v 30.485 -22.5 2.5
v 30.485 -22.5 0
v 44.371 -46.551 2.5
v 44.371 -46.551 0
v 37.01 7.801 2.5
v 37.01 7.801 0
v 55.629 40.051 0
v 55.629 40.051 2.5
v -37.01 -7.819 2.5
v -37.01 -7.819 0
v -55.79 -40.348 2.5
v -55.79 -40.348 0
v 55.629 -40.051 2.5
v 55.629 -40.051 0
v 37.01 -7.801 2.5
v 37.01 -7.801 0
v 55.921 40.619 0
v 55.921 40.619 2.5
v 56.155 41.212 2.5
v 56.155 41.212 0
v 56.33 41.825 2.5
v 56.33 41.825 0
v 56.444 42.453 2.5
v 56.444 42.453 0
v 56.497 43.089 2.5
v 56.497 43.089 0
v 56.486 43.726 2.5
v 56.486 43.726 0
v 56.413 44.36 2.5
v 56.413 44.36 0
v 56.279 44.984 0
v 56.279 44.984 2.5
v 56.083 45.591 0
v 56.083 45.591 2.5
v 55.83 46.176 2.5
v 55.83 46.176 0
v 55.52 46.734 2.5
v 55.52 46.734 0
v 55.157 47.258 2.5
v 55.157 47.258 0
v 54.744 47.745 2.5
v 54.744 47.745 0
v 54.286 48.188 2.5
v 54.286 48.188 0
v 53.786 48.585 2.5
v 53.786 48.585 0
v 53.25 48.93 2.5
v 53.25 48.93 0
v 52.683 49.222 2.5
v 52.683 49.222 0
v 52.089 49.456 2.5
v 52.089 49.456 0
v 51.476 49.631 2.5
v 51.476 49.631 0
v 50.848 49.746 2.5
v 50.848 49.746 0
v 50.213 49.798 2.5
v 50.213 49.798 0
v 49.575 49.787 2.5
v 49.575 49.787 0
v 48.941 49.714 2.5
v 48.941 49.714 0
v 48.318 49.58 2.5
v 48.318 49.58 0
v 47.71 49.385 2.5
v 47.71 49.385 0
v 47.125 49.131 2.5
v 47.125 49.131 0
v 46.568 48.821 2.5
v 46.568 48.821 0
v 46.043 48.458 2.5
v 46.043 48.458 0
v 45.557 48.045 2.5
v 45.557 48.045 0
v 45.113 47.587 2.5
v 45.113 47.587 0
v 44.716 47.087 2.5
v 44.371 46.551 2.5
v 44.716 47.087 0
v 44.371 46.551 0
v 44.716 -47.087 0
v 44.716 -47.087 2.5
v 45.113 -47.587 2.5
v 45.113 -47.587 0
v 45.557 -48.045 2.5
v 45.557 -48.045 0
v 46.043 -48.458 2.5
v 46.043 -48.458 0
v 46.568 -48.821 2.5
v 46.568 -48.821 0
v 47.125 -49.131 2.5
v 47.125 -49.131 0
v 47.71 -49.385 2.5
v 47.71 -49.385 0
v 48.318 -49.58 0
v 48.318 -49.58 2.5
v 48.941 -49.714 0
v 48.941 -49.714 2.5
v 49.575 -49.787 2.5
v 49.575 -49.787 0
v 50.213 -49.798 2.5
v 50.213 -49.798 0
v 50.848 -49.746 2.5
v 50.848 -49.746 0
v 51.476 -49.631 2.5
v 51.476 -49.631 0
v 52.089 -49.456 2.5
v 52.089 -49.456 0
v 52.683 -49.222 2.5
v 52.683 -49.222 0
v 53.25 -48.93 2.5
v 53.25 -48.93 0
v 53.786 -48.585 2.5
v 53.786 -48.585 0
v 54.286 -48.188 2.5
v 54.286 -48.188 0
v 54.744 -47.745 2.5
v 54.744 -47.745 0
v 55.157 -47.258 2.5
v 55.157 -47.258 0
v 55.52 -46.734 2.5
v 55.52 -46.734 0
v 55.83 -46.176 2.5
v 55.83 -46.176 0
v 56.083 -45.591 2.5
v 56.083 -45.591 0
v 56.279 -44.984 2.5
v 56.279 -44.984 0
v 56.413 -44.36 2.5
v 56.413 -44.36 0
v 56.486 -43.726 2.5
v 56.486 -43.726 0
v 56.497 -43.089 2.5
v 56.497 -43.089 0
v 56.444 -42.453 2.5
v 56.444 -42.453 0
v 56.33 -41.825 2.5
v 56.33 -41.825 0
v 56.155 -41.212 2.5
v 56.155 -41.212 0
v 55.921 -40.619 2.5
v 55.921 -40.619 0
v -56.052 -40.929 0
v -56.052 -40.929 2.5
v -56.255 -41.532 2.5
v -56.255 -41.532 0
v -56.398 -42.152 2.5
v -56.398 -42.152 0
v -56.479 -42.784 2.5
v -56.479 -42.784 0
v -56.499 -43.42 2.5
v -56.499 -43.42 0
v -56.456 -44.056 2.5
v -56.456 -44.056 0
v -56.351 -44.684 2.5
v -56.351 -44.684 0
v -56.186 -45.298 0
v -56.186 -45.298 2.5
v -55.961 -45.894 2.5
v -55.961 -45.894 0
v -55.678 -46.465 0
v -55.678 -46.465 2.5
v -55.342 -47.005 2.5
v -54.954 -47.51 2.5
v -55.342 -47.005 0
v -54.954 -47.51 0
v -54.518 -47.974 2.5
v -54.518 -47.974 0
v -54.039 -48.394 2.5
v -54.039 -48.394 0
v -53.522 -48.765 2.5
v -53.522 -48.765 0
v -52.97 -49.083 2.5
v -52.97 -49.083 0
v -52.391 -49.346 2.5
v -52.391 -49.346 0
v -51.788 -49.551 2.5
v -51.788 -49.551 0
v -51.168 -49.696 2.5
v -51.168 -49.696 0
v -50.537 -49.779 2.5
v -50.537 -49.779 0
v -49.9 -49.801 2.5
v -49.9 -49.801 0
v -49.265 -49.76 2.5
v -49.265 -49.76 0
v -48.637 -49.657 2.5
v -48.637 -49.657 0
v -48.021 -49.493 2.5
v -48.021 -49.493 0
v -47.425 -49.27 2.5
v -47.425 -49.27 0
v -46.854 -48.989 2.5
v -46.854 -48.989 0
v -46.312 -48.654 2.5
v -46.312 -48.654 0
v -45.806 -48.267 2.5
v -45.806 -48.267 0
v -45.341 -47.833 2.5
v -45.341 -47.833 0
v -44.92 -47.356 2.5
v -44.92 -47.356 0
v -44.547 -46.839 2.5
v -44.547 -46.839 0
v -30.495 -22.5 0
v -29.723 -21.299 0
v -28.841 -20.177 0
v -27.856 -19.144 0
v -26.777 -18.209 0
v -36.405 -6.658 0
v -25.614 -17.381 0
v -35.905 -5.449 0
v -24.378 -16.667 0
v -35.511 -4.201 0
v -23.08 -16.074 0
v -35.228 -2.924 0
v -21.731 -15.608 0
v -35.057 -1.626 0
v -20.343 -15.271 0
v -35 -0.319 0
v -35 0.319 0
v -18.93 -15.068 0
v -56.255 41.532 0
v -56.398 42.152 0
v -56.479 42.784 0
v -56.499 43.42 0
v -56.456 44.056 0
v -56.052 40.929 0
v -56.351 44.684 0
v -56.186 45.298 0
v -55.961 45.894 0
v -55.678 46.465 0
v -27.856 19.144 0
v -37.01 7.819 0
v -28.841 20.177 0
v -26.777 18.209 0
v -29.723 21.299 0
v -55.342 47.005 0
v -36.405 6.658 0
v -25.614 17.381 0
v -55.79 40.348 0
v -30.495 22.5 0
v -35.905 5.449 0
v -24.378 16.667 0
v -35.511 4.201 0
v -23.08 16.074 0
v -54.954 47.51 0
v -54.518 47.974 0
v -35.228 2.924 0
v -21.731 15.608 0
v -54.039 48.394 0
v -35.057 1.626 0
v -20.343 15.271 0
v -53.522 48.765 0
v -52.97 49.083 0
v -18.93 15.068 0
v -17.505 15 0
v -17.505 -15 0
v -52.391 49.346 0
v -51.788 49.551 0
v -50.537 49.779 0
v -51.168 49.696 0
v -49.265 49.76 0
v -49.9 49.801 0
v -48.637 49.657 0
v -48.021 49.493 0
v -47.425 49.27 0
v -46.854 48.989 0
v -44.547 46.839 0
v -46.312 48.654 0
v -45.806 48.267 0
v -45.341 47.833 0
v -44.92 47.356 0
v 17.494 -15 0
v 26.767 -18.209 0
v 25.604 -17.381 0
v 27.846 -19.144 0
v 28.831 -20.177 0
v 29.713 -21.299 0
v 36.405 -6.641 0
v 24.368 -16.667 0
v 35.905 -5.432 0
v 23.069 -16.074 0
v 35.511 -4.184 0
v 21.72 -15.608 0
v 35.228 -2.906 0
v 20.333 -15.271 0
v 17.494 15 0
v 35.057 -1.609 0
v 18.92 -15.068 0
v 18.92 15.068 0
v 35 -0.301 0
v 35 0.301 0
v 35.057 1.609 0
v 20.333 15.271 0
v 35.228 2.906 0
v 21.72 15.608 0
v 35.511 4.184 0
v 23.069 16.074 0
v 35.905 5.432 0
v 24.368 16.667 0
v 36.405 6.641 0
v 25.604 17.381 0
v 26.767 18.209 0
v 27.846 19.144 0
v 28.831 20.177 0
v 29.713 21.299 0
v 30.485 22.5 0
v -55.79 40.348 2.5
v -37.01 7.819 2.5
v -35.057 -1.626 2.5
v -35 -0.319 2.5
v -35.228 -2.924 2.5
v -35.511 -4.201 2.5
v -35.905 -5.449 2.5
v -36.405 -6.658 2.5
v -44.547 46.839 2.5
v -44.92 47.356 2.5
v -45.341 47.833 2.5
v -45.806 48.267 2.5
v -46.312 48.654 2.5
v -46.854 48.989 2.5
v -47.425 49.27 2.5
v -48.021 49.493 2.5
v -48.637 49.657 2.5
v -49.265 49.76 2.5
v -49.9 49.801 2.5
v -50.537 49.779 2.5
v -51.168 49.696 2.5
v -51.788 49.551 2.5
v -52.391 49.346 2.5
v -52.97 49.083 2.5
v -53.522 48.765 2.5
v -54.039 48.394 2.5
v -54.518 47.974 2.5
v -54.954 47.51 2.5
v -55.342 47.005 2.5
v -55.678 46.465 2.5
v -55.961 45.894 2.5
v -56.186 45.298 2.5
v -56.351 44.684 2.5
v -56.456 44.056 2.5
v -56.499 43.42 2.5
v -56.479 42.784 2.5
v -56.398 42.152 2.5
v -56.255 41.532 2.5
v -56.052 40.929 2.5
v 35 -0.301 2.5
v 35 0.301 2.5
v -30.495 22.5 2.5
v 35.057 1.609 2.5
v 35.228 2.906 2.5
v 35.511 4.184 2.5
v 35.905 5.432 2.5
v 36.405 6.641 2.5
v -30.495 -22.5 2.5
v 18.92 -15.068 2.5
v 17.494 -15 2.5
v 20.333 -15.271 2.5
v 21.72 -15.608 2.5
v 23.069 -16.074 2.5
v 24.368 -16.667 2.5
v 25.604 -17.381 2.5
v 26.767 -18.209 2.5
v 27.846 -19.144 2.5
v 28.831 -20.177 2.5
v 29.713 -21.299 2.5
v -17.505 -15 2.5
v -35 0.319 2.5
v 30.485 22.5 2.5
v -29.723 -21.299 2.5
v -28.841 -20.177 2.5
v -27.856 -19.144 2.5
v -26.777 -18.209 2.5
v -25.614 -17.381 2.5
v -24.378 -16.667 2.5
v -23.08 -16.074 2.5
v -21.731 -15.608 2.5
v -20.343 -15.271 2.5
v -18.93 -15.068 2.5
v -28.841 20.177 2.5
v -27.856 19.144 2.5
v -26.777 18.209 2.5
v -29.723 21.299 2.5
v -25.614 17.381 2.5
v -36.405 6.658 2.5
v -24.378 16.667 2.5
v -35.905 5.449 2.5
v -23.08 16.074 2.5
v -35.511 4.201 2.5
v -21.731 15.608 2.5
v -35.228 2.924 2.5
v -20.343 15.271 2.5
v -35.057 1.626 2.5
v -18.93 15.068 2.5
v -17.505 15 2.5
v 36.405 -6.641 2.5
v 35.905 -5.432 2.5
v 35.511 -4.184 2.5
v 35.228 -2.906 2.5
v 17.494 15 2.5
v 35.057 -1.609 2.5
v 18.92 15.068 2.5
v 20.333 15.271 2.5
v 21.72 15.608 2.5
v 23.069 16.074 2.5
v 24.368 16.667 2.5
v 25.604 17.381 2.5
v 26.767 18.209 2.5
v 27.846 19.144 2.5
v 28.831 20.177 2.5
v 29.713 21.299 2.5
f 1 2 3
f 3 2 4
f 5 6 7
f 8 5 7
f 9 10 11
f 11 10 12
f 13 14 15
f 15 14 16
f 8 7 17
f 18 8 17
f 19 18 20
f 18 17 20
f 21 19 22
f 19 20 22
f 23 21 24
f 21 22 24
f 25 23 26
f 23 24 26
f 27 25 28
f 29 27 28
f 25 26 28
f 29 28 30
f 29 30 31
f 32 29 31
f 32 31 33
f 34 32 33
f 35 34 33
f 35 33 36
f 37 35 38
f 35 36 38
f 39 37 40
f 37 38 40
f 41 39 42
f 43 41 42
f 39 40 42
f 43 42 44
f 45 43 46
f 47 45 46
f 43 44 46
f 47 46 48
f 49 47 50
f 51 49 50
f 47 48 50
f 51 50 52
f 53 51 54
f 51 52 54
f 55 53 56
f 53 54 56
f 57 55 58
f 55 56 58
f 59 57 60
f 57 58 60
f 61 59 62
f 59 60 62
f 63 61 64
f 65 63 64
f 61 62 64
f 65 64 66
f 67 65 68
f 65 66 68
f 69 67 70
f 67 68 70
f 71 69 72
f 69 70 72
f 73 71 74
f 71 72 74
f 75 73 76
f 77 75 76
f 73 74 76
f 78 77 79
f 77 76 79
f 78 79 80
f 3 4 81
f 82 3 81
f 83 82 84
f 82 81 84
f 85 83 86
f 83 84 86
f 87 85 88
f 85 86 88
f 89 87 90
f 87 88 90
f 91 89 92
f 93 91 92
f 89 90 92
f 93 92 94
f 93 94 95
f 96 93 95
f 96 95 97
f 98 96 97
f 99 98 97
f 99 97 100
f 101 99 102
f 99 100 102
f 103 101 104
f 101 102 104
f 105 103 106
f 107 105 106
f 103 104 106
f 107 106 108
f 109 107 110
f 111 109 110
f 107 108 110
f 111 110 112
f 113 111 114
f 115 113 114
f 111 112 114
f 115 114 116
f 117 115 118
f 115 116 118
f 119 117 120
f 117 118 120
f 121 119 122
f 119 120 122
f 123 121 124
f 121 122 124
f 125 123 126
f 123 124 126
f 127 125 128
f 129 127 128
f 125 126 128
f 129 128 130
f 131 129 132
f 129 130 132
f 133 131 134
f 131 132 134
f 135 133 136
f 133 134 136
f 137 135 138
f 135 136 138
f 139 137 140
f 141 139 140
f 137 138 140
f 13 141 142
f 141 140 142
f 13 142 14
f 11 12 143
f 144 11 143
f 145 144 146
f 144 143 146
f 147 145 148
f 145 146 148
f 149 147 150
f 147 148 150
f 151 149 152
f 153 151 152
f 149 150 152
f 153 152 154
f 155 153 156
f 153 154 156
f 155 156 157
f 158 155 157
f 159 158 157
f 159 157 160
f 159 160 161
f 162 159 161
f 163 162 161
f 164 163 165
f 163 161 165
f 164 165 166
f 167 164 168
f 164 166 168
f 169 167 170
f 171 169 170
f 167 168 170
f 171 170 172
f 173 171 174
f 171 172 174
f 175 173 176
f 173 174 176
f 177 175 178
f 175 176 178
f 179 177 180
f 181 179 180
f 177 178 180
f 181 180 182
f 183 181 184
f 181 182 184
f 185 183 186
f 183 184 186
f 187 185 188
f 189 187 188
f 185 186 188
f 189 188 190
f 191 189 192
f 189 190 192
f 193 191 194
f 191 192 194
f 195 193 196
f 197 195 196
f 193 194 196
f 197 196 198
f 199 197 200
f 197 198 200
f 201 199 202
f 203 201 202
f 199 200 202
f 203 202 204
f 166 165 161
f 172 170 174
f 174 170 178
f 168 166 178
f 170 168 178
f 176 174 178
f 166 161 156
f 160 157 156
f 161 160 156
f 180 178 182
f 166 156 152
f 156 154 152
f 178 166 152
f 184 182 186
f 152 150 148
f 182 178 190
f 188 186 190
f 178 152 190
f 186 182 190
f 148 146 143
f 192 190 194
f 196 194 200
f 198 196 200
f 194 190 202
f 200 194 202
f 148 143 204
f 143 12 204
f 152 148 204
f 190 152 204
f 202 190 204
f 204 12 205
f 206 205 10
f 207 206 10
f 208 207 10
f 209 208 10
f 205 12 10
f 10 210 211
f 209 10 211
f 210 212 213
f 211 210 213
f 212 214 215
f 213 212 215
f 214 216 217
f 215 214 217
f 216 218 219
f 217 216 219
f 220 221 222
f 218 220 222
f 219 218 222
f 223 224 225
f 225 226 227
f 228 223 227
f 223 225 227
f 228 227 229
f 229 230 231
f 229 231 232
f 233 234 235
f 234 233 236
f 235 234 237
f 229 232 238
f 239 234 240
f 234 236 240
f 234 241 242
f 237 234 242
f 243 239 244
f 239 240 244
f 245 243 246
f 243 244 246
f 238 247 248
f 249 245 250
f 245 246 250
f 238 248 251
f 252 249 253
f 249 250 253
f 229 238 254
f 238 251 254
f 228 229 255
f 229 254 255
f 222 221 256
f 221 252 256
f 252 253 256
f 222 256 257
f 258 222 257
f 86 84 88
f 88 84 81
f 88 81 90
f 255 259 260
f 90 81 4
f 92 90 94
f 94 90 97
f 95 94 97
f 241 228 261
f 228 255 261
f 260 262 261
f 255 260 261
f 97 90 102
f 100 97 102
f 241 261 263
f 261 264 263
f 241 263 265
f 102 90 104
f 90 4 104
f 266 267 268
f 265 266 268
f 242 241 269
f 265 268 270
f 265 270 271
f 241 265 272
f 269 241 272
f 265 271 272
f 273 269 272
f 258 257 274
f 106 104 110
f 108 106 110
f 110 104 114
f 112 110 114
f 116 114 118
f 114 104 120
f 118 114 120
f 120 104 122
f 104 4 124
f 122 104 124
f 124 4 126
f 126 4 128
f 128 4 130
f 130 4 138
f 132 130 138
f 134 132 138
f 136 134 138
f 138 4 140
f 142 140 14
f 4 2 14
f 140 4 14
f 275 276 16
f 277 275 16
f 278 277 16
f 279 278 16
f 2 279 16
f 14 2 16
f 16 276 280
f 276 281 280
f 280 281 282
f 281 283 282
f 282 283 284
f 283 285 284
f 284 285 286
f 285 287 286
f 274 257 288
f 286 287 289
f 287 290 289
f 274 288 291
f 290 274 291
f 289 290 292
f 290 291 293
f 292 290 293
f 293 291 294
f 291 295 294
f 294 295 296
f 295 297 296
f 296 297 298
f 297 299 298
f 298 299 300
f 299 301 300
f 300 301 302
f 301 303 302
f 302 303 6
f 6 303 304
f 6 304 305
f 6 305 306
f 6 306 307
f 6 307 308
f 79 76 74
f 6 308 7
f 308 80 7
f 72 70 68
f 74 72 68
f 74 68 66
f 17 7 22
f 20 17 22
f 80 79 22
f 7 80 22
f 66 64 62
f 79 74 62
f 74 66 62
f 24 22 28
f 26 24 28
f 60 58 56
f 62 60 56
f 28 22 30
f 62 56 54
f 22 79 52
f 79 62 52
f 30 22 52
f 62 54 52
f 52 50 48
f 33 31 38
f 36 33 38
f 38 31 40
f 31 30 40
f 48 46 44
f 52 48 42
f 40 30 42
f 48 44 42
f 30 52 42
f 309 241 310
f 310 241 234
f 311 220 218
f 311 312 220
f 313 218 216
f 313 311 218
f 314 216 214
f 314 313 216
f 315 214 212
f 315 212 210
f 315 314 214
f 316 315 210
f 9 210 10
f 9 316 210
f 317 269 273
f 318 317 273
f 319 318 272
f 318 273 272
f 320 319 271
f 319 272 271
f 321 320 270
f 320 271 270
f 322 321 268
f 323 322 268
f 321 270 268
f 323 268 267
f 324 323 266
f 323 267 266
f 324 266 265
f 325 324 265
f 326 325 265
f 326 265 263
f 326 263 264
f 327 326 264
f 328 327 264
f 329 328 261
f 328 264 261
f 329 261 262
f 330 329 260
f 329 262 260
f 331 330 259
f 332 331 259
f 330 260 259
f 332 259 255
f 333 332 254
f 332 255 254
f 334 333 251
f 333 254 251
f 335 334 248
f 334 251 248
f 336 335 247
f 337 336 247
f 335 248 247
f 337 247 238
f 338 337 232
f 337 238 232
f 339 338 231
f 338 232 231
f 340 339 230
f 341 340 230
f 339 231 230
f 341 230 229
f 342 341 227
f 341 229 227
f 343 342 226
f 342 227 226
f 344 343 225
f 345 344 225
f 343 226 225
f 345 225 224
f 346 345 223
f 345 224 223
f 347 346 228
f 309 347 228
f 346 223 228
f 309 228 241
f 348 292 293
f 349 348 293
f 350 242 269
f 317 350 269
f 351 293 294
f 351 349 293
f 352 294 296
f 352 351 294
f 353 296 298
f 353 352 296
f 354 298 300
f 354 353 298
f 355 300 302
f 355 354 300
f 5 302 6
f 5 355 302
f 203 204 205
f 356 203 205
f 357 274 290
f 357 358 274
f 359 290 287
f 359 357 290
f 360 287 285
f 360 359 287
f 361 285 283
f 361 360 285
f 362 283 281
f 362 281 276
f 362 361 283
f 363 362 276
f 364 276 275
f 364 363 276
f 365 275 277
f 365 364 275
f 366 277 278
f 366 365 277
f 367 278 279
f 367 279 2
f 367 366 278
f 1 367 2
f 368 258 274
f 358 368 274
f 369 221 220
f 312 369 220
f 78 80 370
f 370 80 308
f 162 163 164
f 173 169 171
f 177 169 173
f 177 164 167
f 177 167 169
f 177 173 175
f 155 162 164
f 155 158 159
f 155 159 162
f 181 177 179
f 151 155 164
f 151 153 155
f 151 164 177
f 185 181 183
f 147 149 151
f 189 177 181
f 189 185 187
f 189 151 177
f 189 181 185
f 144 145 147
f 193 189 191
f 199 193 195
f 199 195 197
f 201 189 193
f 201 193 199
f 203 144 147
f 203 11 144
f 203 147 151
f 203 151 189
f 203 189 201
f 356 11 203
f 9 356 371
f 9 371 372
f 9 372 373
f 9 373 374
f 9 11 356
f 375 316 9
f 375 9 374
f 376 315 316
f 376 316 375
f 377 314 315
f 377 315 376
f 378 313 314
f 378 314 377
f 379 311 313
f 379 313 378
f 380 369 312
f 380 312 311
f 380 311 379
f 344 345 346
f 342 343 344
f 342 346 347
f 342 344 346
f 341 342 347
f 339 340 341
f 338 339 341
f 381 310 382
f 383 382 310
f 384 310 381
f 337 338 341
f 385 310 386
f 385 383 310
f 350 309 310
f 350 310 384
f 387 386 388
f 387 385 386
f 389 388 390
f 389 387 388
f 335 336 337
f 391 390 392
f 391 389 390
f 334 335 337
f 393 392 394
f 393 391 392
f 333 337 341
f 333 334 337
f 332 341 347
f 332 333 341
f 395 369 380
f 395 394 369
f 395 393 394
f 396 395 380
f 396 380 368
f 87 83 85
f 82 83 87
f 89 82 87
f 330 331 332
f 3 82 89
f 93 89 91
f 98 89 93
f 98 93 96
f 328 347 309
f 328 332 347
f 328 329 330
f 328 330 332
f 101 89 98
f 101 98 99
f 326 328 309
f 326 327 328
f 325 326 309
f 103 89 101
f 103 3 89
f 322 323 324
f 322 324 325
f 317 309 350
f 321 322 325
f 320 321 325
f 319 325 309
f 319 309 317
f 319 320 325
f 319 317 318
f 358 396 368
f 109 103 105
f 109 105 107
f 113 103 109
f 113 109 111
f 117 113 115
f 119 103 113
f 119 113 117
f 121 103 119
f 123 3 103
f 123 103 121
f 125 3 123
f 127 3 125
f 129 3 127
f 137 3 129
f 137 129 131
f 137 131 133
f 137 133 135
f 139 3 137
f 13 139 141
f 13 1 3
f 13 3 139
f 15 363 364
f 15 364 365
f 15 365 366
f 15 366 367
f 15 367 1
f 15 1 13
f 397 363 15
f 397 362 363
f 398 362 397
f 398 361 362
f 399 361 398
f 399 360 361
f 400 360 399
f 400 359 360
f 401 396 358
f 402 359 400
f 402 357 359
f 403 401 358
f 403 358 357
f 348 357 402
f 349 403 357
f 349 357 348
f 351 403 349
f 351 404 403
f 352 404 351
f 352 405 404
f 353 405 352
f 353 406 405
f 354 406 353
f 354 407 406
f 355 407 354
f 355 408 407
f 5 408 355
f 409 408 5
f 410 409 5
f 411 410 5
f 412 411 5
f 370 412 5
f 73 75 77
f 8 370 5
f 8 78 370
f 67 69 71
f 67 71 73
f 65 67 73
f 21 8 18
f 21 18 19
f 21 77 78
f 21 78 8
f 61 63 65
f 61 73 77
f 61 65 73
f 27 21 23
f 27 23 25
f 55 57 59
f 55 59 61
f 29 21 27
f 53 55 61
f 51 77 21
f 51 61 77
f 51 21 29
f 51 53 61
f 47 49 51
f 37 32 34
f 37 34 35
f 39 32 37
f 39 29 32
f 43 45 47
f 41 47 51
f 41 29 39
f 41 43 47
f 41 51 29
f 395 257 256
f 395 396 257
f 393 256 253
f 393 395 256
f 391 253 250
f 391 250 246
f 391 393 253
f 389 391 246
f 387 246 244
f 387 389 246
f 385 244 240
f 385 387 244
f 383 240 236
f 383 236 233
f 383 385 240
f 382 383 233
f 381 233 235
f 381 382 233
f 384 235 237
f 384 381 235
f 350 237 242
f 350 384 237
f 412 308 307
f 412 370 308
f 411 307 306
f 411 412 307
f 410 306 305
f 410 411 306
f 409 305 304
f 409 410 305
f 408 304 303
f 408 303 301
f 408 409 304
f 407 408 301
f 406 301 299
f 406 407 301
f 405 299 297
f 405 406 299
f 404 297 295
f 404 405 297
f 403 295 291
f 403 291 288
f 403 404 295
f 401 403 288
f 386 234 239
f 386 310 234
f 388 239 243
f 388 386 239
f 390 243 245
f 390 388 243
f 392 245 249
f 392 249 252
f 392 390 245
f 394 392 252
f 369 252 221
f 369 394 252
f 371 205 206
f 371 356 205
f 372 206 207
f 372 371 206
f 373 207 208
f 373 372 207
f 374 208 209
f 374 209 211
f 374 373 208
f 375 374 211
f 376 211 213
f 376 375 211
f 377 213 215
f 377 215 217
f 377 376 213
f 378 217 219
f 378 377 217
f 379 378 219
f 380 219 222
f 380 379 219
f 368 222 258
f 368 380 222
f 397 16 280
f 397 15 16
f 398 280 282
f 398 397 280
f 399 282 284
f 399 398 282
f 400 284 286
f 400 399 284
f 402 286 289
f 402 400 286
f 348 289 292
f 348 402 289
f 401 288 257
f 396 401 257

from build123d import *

# Parameters (mm, degrees)
F1_DEPTH = 2.5
F2_R     = 15


with BuildPart() as f1:
    # F0 (on Top) → F1 (new body)
    with BuildSketch(Plane.XY):
        with BuildLine():
            ThreePointArc((-44.547231, 46.839252), (-53.25, 48.930435), (-55.790366, 40.348025))
            Line((-55.790366, 40.348025), (-35, 4.338054))
            Line((-35, 4.338054), (-35, 0))
            Line((-35, 0), (-35, -4.338054))
            Line((-35, -4.338054), (-55.790366, -40.348025))
            ThreePointArc((-55.790366, -40.348025), (-53.25, -48.930435), (-44.547231, -46.839252))
            Line((-44.547231, -46.839252), (-26.164831, -15))
            Line((-26.164831, -15), (0, -15))
            Line((0, -15), (26.154701, -15))
            Line((26.154701, -15), (44.370835, -46.55127))
            ThreePointArc((44.370835, -46.55127), (53.25, -48.930435), (55.629165, -40.05127))
            Line((55.629165, -40.05127), (35, -4.320508))
            Line((35, -4.320508), (35, 0))
            Line((35, 0), (35, 4.320508))
            Line((35, 4.320508), (55.629165, 40.05127))
            ThreePointArc((55.629165, 40.05127), (53.25, 48.930435), (44.370835, 46.55127))
            Line((44.370835, 46.55127), (26.154701, 15))
            Line((26.154701, 15), (0, 15))
            Line((0, 15), (-26.164831, 15))
            Line((-26.164831, 15), (-44.547231, 46.839252))
        make_face()
    extrude(amount=F1_DEPTH)

    # F2
    f2_edges = [f1.edges().sort_by_distance(p)[0] for p in [
        (26.154701, 15, 1.25),
        (-26.164831, 15, 1.25),
        (26.154701, -15, 1.25),
        (-26.164831, -15, 1.25),
        (-35, -4.338054, 1.25),
        (-35, 4.338054, 1.25),
        (35, -4.320508, 1.25),
        (35, 4.320508, 1.25),
    ]]
    fillet(f2_edges, radius=F2_R)


solid = f1.part
